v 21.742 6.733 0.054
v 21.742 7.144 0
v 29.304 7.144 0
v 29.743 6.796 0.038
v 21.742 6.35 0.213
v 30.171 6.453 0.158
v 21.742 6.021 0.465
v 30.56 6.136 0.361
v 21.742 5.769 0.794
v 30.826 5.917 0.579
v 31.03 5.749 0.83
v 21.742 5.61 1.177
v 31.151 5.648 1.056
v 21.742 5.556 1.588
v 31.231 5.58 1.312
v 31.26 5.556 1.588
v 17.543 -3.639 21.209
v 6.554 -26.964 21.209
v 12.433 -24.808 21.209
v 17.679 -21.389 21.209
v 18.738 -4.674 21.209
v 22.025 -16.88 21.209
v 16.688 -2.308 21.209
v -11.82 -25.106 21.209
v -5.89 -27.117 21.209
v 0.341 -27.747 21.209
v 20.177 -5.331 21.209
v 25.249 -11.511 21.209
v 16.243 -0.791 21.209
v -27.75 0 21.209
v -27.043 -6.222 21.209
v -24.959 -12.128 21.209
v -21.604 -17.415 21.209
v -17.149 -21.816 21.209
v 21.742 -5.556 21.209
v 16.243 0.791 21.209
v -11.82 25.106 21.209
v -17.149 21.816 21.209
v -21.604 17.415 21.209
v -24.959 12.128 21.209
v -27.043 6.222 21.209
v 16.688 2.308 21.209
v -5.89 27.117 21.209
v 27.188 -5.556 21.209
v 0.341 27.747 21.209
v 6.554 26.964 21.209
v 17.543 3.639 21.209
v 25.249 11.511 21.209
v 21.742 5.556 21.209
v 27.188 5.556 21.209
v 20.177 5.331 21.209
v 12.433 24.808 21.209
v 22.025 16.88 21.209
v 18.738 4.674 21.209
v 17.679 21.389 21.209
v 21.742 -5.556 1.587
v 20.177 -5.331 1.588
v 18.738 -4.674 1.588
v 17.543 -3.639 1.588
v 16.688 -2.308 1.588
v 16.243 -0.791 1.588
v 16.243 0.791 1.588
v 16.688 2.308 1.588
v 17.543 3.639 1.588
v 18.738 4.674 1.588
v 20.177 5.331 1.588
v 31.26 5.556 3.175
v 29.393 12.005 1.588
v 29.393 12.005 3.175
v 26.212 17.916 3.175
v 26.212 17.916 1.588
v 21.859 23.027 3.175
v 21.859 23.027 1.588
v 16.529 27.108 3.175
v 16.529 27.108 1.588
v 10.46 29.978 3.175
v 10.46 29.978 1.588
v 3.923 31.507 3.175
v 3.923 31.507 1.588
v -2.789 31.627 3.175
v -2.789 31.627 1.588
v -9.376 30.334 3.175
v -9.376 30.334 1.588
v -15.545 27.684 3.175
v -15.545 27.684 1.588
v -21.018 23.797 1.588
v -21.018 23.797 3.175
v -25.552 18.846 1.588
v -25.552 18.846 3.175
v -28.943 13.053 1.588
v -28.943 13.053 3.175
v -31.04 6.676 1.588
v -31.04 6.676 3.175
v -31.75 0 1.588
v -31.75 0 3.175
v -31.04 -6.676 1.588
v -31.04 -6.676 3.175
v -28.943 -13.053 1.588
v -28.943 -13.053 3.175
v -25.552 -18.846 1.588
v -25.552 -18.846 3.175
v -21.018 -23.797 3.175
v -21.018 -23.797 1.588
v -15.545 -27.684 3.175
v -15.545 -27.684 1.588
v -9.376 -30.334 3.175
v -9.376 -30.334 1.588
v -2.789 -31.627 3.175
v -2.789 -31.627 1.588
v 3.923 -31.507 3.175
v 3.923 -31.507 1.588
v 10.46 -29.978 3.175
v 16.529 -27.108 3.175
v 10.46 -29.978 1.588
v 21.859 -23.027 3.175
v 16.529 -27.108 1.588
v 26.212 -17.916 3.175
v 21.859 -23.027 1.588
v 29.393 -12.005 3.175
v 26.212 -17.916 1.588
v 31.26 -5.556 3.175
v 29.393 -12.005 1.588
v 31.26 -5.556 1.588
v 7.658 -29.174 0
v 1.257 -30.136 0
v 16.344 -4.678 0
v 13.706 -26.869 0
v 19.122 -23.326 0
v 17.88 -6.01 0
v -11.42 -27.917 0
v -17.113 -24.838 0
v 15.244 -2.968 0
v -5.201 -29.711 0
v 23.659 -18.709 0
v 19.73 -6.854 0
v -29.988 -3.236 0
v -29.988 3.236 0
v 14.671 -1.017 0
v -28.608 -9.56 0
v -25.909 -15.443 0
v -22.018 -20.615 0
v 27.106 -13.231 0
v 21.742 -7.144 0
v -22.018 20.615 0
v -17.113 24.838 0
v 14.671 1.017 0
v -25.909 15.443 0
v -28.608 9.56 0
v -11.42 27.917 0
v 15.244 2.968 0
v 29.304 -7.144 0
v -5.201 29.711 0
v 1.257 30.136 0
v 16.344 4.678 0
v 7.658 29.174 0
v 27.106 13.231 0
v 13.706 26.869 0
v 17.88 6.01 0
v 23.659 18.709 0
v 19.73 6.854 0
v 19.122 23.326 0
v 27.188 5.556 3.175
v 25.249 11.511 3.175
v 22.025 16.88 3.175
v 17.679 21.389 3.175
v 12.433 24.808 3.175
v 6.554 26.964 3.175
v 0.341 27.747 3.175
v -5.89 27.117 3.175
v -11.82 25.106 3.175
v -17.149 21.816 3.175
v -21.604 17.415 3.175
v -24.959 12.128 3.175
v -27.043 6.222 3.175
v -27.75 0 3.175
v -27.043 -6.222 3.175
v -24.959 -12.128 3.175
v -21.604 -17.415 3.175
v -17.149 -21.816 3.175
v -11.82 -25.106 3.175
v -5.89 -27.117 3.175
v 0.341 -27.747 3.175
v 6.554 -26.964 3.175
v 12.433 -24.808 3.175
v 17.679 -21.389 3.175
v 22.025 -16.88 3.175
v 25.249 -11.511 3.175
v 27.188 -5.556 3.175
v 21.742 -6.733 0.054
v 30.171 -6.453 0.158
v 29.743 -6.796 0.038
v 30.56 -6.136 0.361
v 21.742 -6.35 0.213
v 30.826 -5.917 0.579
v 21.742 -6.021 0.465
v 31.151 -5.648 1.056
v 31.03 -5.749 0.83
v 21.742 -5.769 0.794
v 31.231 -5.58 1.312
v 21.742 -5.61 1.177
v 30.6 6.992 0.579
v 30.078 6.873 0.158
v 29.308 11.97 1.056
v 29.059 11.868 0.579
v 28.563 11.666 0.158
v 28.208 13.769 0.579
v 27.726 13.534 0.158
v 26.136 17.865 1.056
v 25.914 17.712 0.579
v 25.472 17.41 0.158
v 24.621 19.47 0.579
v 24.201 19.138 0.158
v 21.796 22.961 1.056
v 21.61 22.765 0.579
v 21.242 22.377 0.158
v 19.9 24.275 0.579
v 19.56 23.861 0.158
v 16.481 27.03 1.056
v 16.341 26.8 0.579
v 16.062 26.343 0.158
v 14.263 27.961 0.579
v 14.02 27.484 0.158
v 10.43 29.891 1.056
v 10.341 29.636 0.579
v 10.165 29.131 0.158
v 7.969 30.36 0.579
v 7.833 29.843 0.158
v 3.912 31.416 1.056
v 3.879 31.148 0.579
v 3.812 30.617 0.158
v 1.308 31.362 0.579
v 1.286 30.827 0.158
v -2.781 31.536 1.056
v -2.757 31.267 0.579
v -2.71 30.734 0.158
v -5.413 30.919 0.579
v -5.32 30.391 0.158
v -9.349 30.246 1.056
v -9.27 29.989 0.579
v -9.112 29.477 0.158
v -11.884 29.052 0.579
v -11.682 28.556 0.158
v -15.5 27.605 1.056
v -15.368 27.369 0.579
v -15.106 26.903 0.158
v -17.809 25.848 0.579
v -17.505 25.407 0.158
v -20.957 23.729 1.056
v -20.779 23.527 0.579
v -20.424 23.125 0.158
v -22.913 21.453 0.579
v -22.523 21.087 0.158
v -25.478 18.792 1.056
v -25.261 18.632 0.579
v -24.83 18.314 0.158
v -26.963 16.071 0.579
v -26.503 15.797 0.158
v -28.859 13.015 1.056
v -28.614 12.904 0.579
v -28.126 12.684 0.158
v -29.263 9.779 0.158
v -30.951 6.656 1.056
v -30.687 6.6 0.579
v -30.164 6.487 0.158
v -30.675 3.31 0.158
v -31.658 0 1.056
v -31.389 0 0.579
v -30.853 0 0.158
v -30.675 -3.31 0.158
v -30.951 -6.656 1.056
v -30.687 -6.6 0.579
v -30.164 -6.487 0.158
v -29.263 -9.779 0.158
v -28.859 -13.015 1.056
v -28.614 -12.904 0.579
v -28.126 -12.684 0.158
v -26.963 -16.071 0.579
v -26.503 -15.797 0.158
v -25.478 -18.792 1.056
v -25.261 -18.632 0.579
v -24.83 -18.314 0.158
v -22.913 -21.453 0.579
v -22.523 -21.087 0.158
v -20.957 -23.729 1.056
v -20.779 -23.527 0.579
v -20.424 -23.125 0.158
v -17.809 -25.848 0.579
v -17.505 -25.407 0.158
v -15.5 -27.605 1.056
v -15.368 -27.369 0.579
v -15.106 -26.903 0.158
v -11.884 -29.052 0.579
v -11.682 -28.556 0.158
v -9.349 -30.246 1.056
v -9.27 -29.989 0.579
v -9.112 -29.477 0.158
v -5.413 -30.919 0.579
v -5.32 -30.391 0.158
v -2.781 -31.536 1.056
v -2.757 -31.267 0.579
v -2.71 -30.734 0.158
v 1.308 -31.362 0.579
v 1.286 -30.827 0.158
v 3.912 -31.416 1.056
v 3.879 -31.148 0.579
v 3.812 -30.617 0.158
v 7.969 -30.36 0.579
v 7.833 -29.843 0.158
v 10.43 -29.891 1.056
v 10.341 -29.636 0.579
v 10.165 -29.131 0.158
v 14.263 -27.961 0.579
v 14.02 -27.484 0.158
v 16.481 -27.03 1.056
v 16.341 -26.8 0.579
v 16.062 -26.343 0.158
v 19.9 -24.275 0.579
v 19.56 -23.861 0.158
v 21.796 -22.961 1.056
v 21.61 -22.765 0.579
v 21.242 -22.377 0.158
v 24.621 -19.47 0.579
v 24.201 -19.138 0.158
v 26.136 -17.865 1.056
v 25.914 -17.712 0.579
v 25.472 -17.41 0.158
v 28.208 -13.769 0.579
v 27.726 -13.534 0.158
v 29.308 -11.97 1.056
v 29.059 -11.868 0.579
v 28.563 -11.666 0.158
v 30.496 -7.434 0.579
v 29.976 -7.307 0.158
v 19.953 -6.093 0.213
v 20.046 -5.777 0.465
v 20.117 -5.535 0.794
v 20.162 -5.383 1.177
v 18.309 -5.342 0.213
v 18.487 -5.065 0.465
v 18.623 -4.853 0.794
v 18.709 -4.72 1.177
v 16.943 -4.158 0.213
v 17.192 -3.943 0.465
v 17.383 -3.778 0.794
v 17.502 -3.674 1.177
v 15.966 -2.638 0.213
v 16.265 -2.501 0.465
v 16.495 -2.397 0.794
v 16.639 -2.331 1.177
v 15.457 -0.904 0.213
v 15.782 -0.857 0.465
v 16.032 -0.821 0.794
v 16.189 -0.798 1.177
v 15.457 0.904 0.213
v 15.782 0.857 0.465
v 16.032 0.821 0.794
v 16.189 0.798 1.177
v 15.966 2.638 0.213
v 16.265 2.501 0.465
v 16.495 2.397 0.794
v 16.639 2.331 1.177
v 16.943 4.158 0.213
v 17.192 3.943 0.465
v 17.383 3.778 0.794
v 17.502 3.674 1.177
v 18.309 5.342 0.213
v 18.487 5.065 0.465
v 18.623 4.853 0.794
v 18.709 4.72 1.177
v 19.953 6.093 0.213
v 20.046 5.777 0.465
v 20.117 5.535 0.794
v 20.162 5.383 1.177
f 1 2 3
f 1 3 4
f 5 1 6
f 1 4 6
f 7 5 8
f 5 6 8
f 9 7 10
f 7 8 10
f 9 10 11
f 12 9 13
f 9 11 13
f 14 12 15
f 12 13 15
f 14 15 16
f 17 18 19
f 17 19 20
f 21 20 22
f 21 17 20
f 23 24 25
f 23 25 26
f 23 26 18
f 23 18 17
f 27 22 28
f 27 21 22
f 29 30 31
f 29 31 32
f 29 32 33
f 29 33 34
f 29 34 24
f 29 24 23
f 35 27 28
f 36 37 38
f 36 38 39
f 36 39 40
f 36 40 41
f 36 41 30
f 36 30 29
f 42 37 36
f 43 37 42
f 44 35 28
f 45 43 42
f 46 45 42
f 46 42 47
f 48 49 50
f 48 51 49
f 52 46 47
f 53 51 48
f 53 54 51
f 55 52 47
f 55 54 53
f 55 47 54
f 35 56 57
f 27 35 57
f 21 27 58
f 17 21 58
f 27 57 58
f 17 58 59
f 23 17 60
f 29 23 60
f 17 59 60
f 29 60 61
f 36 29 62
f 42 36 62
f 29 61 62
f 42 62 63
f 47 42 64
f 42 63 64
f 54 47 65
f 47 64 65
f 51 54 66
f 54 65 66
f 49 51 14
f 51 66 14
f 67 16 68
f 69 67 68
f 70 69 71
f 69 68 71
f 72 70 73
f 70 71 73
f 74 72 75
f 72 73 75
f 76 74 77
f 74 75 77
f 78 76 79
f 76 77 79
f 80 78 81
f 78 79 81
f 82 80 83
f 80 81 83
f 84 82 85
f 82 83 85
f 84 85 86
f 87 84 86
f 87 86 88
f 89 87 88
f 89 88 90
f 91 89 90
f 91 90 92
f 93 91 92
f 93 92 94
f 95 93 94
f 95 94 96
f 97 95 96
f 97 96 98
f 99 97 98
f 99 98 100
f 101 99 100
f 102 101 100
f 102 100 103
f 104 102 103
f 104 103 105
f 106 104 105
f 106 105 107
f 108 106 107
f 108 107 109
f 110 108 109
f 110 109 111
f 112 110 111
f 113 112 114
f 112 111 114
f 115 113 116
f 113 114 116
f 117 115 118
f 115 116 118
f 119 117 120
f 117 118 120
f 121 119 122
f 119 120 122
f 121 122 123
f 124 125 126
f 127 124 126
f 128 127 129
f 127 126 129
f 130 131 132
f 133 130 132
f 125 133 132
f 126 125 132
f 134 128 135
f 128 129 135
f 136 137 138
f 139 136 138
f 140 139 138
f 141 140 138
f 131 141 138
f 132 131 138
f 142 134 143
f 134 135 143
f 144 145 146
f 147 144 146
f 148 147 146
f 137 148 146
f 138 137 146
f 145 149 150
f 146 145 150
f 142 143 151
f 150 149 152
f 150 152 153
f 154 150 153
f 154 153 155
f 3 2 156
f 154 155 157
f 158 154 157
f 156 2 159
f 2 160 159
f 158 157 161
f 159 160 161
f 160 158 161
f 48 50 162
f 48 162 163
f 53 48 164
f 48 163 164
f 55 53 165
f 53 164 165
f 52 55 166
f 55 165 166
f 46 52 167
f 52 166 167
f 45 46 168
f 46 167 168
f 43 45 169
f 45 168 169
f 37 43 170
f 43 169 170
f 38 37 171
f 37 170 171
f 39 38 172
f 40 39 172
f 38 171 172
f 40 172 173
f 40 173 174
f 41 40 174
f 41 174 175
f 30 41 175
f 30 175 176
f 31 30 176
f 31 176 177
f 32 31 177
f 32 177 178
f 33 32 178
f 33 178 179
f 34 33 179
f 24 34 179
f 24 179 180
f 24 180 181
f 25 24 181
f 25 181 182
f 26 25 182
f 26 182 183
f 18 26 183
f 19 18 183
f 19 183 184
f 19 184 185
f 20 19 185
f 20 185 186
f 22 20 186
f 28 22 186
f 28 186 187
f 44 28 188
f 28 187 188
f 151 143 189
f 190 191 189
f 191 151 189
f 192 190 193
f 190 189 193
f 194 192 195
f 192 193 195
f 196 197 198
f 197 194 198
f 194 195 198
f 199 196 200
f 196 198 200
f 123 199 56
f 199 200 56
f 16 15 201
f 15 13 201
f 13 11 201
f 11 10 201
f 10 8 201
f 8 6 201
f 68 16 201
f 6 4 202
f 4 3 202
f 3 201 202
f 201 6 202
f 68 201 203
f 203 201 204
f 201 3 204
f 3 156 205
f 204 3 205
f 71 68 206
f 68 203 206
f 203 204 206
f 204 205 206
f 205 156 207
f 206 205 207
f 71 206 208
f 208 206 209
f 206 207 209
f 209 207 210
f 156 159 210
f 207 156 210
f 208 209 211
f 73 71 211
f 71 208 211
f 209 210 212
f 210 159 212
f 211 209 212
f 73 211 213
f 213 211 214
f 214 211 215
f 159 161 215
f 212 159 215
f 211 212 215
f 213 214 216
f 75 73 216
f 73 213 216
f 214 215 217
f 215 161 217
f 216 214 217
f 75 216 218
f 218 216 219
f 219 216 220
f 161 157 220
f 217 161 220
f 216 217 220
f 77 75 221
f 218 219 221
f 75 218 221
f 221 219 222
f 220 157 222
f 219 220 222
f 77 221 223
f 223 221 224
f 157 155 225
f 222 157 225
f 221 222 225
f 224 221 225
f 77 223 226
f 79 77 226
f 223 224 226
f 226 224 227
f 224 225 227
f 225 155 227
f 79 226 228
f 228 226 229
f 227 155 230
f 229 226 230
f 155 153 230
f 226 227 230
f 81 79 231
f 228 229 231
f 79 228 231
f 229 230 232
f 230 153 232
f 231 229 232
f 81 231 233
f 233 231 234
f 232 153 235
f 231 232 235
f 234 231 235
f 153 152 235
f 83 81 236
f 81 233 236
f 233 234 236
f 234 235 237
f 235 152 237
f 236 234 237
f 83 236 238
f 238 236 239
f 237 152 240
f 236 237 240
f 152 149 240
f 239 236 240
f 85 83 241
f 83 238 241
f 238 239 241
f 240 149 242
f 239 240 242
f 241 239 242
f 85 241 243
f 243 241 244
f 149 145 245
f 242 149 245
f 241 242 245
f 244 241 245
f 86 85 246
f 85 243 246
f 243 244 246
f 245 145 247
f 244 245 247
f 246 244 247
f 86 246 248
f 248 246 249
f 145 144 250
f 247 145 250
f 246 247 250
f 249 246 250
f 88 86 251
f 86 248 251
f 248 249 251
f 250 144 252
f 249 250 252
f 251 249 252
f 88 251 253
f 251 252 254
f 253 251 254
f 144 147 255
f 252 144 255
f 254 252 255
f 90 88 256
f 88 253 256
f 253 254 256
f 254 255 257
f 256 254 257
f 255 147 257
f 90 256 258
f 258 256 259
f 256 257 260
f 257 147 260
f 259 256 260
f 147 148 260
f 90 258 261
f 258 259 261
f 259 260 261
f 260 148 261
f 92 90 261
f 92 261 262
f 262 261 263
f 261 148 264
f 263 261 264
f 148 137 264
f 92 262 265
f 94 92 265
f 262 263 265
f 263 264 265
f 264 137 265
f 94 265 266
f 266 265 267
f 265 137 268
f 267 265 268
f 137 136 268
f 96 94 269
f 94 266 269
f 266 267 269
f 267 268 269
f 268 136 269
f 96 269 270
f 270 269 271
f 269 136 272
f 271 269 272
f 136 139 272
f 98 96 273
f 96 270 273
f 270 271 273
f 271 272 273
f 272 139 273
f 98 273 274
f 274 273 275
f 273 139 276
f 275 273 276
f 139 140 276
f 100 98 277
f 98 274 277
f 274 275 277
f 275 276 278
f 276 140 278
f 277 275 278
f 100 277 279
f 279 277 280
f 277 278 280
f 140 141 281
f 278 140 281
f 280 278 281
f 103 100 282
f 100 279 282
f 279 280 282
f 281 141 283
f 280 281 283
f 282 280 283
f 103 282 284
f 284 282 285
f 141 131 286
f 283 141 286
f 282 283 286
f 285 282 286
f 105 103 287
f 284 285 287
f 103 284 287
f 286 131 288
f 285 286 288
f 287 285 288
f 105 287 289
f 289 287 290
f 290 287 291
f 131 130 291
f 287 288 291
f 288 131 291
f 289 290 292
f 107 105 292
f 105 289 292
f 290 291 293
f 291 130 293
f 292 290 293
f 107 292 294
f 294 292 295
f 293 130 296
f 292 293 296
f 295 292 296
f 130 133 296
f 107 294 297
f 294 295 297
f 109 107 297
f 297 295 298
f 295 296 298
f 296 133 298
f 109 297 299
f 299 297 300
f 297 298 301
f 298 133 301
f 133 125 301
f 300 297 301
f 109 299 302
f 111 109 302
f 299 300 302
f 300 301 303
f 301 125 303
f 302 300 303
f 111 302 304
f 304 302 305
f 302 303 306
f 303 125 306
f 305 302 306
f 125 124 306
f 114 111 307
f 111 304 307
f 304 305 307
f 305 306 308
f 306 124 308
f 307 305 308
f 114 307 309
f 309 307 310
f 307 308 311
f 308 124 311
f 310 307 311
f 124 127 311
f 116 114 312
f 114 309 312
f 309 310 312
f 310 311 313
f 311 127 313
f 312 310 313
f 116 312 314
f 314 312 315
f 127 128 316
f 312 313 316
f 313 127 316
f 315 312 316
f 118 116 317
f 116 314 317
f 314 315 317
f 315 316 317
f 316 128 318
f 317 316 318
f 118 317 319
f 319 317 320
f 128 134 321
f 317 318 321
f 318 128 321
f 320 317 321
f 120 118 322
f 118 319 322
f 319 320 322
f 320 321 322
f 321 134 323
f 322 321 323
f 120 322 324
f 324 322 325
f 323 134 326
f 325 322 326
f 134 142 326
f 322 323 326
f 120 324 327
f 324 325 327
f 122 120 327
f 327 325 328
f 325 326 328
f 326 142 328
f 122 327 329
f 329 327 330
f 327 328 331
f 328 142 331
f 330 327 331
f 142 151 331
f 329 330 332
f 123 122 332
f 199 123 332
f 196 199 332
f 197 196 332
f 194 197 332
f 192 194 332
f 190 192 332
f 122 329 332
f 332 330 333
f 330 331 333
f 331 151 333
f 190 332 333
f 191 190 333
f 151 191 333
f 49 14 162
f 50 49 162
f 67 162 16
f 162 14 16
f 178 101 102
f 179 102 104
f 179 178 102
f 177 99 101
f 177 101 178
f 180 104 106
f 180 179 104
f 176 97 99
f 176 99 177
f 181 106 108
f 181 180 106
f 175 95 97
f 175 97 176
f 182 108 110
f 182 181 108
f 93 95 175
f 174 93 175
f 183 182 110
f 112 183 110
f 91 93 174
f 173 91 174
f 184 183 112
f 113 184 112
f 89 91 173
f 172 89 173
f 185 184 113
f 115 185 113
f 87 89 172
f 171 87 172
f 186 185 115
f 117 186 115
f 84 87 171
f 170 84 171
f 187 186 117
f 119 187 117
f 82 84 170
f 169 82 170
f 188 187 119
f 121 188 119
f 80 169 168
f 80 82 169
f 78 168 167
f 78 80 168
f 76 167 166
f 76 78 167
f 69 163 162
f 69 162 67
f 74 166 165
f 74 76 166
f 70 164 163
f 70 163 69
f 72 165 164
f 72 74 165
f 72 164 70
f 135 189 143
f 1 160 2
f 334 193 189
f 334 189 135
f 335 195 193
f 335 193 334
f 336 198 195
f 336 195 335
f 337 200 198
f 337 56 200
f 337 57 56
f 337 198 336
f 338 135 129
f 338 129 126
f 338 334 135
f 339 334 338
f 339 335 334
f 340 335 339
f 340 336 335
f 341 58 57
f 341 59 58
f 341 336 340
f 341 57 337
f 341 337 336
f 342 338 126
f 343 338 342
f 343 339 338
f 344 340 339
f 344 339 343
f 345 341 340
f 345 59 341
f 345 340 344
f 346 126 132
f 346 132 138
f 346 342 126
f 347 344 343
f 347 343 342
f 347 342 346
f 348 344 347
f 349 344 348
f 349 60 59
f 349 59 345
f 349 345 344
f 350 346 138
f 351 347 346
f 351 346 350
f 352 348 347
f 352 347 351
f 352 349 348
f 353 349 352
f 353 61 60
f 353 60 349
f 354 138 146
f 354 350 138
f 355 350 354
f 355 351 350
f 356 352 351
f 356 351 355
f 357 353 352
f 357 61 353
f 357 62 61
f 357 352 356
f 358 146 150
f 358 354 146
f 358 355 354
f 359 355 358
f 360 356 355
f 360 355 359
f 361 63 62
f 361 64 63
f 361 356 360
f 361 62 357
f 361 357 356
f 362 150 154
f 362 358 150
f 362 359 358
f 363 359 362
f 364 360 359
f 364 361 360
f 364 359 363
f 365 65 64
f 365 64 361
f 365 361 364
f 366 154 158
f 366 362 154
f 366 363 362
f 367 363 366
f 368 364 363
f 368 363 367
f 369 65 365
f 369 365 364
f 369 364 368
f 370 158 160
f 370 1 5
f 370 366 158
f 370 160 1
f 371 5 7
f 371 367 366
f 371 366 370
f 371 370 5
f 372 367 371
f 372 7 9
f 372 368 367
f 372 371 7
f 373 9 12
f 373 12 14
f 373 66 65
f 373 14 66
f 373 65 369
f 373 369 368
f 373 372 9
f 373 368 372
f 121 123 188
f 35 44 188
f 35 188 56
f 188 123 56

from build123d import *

# Parameters (mm, degrees)
F0_R     = 31.75
F1_DEPTH = 3.175
F2_R     = 27.7495
F3_DEPTH = 18.034
F5_DEPTH = 25.4
F6_R     = 1.5875


with BuildPart() as f1:
    # F0 (on Top) → F1 (new body)
    with BuildSketch(Plane.XY):
        Circle(F0_R)
    extrude(amount=F1_DEPTH)

    # F2 (on face) → F3 (join)
    with BuildSketch(Plane.XY.offset(3.175)):
        Circle(F2_R)
    extrude(amount=F3_DEPTH)

    # F4 (on face) → F5 (cut)
    with BuildSketch(Plane(origin=(0, 0, 0), x_dir=(1, 0, 0), z_dir=(0, 0, -1))):
        with BuildLine():
            ThreePointArc((31.75, 0), (31.627275, 2.788905), (31.260048, 5.55625))
            Line((31.260048, 5.55625), (21.7424, 5.55625))
            ThreePointArc((21.7424, 5.55625), (16.18615, 0), (21.7424, -5.55625))
            Line((21.7424, -5.55625), (31.260048, -5.55625))
            ThreePointArc((31.260048, -5.55625), (31.627275, -2.788905), (31.75, 0))
        make_face()
    extrude(amount=-F5_DEPTH, mode=Mode.SUBTRACT)

    # F6
    f6_edges = [f1.edges().sort_by_distance(p)[0] for p in [
        (-31.75, 0, 0),
        (26.501224, -5.55625, 0),
        (16.18615, 0, 0),
        (26.501224, 5.55625, 0),
    ]]
    fillet(f6_edges, radius=F6_R)


solid = f1.part
